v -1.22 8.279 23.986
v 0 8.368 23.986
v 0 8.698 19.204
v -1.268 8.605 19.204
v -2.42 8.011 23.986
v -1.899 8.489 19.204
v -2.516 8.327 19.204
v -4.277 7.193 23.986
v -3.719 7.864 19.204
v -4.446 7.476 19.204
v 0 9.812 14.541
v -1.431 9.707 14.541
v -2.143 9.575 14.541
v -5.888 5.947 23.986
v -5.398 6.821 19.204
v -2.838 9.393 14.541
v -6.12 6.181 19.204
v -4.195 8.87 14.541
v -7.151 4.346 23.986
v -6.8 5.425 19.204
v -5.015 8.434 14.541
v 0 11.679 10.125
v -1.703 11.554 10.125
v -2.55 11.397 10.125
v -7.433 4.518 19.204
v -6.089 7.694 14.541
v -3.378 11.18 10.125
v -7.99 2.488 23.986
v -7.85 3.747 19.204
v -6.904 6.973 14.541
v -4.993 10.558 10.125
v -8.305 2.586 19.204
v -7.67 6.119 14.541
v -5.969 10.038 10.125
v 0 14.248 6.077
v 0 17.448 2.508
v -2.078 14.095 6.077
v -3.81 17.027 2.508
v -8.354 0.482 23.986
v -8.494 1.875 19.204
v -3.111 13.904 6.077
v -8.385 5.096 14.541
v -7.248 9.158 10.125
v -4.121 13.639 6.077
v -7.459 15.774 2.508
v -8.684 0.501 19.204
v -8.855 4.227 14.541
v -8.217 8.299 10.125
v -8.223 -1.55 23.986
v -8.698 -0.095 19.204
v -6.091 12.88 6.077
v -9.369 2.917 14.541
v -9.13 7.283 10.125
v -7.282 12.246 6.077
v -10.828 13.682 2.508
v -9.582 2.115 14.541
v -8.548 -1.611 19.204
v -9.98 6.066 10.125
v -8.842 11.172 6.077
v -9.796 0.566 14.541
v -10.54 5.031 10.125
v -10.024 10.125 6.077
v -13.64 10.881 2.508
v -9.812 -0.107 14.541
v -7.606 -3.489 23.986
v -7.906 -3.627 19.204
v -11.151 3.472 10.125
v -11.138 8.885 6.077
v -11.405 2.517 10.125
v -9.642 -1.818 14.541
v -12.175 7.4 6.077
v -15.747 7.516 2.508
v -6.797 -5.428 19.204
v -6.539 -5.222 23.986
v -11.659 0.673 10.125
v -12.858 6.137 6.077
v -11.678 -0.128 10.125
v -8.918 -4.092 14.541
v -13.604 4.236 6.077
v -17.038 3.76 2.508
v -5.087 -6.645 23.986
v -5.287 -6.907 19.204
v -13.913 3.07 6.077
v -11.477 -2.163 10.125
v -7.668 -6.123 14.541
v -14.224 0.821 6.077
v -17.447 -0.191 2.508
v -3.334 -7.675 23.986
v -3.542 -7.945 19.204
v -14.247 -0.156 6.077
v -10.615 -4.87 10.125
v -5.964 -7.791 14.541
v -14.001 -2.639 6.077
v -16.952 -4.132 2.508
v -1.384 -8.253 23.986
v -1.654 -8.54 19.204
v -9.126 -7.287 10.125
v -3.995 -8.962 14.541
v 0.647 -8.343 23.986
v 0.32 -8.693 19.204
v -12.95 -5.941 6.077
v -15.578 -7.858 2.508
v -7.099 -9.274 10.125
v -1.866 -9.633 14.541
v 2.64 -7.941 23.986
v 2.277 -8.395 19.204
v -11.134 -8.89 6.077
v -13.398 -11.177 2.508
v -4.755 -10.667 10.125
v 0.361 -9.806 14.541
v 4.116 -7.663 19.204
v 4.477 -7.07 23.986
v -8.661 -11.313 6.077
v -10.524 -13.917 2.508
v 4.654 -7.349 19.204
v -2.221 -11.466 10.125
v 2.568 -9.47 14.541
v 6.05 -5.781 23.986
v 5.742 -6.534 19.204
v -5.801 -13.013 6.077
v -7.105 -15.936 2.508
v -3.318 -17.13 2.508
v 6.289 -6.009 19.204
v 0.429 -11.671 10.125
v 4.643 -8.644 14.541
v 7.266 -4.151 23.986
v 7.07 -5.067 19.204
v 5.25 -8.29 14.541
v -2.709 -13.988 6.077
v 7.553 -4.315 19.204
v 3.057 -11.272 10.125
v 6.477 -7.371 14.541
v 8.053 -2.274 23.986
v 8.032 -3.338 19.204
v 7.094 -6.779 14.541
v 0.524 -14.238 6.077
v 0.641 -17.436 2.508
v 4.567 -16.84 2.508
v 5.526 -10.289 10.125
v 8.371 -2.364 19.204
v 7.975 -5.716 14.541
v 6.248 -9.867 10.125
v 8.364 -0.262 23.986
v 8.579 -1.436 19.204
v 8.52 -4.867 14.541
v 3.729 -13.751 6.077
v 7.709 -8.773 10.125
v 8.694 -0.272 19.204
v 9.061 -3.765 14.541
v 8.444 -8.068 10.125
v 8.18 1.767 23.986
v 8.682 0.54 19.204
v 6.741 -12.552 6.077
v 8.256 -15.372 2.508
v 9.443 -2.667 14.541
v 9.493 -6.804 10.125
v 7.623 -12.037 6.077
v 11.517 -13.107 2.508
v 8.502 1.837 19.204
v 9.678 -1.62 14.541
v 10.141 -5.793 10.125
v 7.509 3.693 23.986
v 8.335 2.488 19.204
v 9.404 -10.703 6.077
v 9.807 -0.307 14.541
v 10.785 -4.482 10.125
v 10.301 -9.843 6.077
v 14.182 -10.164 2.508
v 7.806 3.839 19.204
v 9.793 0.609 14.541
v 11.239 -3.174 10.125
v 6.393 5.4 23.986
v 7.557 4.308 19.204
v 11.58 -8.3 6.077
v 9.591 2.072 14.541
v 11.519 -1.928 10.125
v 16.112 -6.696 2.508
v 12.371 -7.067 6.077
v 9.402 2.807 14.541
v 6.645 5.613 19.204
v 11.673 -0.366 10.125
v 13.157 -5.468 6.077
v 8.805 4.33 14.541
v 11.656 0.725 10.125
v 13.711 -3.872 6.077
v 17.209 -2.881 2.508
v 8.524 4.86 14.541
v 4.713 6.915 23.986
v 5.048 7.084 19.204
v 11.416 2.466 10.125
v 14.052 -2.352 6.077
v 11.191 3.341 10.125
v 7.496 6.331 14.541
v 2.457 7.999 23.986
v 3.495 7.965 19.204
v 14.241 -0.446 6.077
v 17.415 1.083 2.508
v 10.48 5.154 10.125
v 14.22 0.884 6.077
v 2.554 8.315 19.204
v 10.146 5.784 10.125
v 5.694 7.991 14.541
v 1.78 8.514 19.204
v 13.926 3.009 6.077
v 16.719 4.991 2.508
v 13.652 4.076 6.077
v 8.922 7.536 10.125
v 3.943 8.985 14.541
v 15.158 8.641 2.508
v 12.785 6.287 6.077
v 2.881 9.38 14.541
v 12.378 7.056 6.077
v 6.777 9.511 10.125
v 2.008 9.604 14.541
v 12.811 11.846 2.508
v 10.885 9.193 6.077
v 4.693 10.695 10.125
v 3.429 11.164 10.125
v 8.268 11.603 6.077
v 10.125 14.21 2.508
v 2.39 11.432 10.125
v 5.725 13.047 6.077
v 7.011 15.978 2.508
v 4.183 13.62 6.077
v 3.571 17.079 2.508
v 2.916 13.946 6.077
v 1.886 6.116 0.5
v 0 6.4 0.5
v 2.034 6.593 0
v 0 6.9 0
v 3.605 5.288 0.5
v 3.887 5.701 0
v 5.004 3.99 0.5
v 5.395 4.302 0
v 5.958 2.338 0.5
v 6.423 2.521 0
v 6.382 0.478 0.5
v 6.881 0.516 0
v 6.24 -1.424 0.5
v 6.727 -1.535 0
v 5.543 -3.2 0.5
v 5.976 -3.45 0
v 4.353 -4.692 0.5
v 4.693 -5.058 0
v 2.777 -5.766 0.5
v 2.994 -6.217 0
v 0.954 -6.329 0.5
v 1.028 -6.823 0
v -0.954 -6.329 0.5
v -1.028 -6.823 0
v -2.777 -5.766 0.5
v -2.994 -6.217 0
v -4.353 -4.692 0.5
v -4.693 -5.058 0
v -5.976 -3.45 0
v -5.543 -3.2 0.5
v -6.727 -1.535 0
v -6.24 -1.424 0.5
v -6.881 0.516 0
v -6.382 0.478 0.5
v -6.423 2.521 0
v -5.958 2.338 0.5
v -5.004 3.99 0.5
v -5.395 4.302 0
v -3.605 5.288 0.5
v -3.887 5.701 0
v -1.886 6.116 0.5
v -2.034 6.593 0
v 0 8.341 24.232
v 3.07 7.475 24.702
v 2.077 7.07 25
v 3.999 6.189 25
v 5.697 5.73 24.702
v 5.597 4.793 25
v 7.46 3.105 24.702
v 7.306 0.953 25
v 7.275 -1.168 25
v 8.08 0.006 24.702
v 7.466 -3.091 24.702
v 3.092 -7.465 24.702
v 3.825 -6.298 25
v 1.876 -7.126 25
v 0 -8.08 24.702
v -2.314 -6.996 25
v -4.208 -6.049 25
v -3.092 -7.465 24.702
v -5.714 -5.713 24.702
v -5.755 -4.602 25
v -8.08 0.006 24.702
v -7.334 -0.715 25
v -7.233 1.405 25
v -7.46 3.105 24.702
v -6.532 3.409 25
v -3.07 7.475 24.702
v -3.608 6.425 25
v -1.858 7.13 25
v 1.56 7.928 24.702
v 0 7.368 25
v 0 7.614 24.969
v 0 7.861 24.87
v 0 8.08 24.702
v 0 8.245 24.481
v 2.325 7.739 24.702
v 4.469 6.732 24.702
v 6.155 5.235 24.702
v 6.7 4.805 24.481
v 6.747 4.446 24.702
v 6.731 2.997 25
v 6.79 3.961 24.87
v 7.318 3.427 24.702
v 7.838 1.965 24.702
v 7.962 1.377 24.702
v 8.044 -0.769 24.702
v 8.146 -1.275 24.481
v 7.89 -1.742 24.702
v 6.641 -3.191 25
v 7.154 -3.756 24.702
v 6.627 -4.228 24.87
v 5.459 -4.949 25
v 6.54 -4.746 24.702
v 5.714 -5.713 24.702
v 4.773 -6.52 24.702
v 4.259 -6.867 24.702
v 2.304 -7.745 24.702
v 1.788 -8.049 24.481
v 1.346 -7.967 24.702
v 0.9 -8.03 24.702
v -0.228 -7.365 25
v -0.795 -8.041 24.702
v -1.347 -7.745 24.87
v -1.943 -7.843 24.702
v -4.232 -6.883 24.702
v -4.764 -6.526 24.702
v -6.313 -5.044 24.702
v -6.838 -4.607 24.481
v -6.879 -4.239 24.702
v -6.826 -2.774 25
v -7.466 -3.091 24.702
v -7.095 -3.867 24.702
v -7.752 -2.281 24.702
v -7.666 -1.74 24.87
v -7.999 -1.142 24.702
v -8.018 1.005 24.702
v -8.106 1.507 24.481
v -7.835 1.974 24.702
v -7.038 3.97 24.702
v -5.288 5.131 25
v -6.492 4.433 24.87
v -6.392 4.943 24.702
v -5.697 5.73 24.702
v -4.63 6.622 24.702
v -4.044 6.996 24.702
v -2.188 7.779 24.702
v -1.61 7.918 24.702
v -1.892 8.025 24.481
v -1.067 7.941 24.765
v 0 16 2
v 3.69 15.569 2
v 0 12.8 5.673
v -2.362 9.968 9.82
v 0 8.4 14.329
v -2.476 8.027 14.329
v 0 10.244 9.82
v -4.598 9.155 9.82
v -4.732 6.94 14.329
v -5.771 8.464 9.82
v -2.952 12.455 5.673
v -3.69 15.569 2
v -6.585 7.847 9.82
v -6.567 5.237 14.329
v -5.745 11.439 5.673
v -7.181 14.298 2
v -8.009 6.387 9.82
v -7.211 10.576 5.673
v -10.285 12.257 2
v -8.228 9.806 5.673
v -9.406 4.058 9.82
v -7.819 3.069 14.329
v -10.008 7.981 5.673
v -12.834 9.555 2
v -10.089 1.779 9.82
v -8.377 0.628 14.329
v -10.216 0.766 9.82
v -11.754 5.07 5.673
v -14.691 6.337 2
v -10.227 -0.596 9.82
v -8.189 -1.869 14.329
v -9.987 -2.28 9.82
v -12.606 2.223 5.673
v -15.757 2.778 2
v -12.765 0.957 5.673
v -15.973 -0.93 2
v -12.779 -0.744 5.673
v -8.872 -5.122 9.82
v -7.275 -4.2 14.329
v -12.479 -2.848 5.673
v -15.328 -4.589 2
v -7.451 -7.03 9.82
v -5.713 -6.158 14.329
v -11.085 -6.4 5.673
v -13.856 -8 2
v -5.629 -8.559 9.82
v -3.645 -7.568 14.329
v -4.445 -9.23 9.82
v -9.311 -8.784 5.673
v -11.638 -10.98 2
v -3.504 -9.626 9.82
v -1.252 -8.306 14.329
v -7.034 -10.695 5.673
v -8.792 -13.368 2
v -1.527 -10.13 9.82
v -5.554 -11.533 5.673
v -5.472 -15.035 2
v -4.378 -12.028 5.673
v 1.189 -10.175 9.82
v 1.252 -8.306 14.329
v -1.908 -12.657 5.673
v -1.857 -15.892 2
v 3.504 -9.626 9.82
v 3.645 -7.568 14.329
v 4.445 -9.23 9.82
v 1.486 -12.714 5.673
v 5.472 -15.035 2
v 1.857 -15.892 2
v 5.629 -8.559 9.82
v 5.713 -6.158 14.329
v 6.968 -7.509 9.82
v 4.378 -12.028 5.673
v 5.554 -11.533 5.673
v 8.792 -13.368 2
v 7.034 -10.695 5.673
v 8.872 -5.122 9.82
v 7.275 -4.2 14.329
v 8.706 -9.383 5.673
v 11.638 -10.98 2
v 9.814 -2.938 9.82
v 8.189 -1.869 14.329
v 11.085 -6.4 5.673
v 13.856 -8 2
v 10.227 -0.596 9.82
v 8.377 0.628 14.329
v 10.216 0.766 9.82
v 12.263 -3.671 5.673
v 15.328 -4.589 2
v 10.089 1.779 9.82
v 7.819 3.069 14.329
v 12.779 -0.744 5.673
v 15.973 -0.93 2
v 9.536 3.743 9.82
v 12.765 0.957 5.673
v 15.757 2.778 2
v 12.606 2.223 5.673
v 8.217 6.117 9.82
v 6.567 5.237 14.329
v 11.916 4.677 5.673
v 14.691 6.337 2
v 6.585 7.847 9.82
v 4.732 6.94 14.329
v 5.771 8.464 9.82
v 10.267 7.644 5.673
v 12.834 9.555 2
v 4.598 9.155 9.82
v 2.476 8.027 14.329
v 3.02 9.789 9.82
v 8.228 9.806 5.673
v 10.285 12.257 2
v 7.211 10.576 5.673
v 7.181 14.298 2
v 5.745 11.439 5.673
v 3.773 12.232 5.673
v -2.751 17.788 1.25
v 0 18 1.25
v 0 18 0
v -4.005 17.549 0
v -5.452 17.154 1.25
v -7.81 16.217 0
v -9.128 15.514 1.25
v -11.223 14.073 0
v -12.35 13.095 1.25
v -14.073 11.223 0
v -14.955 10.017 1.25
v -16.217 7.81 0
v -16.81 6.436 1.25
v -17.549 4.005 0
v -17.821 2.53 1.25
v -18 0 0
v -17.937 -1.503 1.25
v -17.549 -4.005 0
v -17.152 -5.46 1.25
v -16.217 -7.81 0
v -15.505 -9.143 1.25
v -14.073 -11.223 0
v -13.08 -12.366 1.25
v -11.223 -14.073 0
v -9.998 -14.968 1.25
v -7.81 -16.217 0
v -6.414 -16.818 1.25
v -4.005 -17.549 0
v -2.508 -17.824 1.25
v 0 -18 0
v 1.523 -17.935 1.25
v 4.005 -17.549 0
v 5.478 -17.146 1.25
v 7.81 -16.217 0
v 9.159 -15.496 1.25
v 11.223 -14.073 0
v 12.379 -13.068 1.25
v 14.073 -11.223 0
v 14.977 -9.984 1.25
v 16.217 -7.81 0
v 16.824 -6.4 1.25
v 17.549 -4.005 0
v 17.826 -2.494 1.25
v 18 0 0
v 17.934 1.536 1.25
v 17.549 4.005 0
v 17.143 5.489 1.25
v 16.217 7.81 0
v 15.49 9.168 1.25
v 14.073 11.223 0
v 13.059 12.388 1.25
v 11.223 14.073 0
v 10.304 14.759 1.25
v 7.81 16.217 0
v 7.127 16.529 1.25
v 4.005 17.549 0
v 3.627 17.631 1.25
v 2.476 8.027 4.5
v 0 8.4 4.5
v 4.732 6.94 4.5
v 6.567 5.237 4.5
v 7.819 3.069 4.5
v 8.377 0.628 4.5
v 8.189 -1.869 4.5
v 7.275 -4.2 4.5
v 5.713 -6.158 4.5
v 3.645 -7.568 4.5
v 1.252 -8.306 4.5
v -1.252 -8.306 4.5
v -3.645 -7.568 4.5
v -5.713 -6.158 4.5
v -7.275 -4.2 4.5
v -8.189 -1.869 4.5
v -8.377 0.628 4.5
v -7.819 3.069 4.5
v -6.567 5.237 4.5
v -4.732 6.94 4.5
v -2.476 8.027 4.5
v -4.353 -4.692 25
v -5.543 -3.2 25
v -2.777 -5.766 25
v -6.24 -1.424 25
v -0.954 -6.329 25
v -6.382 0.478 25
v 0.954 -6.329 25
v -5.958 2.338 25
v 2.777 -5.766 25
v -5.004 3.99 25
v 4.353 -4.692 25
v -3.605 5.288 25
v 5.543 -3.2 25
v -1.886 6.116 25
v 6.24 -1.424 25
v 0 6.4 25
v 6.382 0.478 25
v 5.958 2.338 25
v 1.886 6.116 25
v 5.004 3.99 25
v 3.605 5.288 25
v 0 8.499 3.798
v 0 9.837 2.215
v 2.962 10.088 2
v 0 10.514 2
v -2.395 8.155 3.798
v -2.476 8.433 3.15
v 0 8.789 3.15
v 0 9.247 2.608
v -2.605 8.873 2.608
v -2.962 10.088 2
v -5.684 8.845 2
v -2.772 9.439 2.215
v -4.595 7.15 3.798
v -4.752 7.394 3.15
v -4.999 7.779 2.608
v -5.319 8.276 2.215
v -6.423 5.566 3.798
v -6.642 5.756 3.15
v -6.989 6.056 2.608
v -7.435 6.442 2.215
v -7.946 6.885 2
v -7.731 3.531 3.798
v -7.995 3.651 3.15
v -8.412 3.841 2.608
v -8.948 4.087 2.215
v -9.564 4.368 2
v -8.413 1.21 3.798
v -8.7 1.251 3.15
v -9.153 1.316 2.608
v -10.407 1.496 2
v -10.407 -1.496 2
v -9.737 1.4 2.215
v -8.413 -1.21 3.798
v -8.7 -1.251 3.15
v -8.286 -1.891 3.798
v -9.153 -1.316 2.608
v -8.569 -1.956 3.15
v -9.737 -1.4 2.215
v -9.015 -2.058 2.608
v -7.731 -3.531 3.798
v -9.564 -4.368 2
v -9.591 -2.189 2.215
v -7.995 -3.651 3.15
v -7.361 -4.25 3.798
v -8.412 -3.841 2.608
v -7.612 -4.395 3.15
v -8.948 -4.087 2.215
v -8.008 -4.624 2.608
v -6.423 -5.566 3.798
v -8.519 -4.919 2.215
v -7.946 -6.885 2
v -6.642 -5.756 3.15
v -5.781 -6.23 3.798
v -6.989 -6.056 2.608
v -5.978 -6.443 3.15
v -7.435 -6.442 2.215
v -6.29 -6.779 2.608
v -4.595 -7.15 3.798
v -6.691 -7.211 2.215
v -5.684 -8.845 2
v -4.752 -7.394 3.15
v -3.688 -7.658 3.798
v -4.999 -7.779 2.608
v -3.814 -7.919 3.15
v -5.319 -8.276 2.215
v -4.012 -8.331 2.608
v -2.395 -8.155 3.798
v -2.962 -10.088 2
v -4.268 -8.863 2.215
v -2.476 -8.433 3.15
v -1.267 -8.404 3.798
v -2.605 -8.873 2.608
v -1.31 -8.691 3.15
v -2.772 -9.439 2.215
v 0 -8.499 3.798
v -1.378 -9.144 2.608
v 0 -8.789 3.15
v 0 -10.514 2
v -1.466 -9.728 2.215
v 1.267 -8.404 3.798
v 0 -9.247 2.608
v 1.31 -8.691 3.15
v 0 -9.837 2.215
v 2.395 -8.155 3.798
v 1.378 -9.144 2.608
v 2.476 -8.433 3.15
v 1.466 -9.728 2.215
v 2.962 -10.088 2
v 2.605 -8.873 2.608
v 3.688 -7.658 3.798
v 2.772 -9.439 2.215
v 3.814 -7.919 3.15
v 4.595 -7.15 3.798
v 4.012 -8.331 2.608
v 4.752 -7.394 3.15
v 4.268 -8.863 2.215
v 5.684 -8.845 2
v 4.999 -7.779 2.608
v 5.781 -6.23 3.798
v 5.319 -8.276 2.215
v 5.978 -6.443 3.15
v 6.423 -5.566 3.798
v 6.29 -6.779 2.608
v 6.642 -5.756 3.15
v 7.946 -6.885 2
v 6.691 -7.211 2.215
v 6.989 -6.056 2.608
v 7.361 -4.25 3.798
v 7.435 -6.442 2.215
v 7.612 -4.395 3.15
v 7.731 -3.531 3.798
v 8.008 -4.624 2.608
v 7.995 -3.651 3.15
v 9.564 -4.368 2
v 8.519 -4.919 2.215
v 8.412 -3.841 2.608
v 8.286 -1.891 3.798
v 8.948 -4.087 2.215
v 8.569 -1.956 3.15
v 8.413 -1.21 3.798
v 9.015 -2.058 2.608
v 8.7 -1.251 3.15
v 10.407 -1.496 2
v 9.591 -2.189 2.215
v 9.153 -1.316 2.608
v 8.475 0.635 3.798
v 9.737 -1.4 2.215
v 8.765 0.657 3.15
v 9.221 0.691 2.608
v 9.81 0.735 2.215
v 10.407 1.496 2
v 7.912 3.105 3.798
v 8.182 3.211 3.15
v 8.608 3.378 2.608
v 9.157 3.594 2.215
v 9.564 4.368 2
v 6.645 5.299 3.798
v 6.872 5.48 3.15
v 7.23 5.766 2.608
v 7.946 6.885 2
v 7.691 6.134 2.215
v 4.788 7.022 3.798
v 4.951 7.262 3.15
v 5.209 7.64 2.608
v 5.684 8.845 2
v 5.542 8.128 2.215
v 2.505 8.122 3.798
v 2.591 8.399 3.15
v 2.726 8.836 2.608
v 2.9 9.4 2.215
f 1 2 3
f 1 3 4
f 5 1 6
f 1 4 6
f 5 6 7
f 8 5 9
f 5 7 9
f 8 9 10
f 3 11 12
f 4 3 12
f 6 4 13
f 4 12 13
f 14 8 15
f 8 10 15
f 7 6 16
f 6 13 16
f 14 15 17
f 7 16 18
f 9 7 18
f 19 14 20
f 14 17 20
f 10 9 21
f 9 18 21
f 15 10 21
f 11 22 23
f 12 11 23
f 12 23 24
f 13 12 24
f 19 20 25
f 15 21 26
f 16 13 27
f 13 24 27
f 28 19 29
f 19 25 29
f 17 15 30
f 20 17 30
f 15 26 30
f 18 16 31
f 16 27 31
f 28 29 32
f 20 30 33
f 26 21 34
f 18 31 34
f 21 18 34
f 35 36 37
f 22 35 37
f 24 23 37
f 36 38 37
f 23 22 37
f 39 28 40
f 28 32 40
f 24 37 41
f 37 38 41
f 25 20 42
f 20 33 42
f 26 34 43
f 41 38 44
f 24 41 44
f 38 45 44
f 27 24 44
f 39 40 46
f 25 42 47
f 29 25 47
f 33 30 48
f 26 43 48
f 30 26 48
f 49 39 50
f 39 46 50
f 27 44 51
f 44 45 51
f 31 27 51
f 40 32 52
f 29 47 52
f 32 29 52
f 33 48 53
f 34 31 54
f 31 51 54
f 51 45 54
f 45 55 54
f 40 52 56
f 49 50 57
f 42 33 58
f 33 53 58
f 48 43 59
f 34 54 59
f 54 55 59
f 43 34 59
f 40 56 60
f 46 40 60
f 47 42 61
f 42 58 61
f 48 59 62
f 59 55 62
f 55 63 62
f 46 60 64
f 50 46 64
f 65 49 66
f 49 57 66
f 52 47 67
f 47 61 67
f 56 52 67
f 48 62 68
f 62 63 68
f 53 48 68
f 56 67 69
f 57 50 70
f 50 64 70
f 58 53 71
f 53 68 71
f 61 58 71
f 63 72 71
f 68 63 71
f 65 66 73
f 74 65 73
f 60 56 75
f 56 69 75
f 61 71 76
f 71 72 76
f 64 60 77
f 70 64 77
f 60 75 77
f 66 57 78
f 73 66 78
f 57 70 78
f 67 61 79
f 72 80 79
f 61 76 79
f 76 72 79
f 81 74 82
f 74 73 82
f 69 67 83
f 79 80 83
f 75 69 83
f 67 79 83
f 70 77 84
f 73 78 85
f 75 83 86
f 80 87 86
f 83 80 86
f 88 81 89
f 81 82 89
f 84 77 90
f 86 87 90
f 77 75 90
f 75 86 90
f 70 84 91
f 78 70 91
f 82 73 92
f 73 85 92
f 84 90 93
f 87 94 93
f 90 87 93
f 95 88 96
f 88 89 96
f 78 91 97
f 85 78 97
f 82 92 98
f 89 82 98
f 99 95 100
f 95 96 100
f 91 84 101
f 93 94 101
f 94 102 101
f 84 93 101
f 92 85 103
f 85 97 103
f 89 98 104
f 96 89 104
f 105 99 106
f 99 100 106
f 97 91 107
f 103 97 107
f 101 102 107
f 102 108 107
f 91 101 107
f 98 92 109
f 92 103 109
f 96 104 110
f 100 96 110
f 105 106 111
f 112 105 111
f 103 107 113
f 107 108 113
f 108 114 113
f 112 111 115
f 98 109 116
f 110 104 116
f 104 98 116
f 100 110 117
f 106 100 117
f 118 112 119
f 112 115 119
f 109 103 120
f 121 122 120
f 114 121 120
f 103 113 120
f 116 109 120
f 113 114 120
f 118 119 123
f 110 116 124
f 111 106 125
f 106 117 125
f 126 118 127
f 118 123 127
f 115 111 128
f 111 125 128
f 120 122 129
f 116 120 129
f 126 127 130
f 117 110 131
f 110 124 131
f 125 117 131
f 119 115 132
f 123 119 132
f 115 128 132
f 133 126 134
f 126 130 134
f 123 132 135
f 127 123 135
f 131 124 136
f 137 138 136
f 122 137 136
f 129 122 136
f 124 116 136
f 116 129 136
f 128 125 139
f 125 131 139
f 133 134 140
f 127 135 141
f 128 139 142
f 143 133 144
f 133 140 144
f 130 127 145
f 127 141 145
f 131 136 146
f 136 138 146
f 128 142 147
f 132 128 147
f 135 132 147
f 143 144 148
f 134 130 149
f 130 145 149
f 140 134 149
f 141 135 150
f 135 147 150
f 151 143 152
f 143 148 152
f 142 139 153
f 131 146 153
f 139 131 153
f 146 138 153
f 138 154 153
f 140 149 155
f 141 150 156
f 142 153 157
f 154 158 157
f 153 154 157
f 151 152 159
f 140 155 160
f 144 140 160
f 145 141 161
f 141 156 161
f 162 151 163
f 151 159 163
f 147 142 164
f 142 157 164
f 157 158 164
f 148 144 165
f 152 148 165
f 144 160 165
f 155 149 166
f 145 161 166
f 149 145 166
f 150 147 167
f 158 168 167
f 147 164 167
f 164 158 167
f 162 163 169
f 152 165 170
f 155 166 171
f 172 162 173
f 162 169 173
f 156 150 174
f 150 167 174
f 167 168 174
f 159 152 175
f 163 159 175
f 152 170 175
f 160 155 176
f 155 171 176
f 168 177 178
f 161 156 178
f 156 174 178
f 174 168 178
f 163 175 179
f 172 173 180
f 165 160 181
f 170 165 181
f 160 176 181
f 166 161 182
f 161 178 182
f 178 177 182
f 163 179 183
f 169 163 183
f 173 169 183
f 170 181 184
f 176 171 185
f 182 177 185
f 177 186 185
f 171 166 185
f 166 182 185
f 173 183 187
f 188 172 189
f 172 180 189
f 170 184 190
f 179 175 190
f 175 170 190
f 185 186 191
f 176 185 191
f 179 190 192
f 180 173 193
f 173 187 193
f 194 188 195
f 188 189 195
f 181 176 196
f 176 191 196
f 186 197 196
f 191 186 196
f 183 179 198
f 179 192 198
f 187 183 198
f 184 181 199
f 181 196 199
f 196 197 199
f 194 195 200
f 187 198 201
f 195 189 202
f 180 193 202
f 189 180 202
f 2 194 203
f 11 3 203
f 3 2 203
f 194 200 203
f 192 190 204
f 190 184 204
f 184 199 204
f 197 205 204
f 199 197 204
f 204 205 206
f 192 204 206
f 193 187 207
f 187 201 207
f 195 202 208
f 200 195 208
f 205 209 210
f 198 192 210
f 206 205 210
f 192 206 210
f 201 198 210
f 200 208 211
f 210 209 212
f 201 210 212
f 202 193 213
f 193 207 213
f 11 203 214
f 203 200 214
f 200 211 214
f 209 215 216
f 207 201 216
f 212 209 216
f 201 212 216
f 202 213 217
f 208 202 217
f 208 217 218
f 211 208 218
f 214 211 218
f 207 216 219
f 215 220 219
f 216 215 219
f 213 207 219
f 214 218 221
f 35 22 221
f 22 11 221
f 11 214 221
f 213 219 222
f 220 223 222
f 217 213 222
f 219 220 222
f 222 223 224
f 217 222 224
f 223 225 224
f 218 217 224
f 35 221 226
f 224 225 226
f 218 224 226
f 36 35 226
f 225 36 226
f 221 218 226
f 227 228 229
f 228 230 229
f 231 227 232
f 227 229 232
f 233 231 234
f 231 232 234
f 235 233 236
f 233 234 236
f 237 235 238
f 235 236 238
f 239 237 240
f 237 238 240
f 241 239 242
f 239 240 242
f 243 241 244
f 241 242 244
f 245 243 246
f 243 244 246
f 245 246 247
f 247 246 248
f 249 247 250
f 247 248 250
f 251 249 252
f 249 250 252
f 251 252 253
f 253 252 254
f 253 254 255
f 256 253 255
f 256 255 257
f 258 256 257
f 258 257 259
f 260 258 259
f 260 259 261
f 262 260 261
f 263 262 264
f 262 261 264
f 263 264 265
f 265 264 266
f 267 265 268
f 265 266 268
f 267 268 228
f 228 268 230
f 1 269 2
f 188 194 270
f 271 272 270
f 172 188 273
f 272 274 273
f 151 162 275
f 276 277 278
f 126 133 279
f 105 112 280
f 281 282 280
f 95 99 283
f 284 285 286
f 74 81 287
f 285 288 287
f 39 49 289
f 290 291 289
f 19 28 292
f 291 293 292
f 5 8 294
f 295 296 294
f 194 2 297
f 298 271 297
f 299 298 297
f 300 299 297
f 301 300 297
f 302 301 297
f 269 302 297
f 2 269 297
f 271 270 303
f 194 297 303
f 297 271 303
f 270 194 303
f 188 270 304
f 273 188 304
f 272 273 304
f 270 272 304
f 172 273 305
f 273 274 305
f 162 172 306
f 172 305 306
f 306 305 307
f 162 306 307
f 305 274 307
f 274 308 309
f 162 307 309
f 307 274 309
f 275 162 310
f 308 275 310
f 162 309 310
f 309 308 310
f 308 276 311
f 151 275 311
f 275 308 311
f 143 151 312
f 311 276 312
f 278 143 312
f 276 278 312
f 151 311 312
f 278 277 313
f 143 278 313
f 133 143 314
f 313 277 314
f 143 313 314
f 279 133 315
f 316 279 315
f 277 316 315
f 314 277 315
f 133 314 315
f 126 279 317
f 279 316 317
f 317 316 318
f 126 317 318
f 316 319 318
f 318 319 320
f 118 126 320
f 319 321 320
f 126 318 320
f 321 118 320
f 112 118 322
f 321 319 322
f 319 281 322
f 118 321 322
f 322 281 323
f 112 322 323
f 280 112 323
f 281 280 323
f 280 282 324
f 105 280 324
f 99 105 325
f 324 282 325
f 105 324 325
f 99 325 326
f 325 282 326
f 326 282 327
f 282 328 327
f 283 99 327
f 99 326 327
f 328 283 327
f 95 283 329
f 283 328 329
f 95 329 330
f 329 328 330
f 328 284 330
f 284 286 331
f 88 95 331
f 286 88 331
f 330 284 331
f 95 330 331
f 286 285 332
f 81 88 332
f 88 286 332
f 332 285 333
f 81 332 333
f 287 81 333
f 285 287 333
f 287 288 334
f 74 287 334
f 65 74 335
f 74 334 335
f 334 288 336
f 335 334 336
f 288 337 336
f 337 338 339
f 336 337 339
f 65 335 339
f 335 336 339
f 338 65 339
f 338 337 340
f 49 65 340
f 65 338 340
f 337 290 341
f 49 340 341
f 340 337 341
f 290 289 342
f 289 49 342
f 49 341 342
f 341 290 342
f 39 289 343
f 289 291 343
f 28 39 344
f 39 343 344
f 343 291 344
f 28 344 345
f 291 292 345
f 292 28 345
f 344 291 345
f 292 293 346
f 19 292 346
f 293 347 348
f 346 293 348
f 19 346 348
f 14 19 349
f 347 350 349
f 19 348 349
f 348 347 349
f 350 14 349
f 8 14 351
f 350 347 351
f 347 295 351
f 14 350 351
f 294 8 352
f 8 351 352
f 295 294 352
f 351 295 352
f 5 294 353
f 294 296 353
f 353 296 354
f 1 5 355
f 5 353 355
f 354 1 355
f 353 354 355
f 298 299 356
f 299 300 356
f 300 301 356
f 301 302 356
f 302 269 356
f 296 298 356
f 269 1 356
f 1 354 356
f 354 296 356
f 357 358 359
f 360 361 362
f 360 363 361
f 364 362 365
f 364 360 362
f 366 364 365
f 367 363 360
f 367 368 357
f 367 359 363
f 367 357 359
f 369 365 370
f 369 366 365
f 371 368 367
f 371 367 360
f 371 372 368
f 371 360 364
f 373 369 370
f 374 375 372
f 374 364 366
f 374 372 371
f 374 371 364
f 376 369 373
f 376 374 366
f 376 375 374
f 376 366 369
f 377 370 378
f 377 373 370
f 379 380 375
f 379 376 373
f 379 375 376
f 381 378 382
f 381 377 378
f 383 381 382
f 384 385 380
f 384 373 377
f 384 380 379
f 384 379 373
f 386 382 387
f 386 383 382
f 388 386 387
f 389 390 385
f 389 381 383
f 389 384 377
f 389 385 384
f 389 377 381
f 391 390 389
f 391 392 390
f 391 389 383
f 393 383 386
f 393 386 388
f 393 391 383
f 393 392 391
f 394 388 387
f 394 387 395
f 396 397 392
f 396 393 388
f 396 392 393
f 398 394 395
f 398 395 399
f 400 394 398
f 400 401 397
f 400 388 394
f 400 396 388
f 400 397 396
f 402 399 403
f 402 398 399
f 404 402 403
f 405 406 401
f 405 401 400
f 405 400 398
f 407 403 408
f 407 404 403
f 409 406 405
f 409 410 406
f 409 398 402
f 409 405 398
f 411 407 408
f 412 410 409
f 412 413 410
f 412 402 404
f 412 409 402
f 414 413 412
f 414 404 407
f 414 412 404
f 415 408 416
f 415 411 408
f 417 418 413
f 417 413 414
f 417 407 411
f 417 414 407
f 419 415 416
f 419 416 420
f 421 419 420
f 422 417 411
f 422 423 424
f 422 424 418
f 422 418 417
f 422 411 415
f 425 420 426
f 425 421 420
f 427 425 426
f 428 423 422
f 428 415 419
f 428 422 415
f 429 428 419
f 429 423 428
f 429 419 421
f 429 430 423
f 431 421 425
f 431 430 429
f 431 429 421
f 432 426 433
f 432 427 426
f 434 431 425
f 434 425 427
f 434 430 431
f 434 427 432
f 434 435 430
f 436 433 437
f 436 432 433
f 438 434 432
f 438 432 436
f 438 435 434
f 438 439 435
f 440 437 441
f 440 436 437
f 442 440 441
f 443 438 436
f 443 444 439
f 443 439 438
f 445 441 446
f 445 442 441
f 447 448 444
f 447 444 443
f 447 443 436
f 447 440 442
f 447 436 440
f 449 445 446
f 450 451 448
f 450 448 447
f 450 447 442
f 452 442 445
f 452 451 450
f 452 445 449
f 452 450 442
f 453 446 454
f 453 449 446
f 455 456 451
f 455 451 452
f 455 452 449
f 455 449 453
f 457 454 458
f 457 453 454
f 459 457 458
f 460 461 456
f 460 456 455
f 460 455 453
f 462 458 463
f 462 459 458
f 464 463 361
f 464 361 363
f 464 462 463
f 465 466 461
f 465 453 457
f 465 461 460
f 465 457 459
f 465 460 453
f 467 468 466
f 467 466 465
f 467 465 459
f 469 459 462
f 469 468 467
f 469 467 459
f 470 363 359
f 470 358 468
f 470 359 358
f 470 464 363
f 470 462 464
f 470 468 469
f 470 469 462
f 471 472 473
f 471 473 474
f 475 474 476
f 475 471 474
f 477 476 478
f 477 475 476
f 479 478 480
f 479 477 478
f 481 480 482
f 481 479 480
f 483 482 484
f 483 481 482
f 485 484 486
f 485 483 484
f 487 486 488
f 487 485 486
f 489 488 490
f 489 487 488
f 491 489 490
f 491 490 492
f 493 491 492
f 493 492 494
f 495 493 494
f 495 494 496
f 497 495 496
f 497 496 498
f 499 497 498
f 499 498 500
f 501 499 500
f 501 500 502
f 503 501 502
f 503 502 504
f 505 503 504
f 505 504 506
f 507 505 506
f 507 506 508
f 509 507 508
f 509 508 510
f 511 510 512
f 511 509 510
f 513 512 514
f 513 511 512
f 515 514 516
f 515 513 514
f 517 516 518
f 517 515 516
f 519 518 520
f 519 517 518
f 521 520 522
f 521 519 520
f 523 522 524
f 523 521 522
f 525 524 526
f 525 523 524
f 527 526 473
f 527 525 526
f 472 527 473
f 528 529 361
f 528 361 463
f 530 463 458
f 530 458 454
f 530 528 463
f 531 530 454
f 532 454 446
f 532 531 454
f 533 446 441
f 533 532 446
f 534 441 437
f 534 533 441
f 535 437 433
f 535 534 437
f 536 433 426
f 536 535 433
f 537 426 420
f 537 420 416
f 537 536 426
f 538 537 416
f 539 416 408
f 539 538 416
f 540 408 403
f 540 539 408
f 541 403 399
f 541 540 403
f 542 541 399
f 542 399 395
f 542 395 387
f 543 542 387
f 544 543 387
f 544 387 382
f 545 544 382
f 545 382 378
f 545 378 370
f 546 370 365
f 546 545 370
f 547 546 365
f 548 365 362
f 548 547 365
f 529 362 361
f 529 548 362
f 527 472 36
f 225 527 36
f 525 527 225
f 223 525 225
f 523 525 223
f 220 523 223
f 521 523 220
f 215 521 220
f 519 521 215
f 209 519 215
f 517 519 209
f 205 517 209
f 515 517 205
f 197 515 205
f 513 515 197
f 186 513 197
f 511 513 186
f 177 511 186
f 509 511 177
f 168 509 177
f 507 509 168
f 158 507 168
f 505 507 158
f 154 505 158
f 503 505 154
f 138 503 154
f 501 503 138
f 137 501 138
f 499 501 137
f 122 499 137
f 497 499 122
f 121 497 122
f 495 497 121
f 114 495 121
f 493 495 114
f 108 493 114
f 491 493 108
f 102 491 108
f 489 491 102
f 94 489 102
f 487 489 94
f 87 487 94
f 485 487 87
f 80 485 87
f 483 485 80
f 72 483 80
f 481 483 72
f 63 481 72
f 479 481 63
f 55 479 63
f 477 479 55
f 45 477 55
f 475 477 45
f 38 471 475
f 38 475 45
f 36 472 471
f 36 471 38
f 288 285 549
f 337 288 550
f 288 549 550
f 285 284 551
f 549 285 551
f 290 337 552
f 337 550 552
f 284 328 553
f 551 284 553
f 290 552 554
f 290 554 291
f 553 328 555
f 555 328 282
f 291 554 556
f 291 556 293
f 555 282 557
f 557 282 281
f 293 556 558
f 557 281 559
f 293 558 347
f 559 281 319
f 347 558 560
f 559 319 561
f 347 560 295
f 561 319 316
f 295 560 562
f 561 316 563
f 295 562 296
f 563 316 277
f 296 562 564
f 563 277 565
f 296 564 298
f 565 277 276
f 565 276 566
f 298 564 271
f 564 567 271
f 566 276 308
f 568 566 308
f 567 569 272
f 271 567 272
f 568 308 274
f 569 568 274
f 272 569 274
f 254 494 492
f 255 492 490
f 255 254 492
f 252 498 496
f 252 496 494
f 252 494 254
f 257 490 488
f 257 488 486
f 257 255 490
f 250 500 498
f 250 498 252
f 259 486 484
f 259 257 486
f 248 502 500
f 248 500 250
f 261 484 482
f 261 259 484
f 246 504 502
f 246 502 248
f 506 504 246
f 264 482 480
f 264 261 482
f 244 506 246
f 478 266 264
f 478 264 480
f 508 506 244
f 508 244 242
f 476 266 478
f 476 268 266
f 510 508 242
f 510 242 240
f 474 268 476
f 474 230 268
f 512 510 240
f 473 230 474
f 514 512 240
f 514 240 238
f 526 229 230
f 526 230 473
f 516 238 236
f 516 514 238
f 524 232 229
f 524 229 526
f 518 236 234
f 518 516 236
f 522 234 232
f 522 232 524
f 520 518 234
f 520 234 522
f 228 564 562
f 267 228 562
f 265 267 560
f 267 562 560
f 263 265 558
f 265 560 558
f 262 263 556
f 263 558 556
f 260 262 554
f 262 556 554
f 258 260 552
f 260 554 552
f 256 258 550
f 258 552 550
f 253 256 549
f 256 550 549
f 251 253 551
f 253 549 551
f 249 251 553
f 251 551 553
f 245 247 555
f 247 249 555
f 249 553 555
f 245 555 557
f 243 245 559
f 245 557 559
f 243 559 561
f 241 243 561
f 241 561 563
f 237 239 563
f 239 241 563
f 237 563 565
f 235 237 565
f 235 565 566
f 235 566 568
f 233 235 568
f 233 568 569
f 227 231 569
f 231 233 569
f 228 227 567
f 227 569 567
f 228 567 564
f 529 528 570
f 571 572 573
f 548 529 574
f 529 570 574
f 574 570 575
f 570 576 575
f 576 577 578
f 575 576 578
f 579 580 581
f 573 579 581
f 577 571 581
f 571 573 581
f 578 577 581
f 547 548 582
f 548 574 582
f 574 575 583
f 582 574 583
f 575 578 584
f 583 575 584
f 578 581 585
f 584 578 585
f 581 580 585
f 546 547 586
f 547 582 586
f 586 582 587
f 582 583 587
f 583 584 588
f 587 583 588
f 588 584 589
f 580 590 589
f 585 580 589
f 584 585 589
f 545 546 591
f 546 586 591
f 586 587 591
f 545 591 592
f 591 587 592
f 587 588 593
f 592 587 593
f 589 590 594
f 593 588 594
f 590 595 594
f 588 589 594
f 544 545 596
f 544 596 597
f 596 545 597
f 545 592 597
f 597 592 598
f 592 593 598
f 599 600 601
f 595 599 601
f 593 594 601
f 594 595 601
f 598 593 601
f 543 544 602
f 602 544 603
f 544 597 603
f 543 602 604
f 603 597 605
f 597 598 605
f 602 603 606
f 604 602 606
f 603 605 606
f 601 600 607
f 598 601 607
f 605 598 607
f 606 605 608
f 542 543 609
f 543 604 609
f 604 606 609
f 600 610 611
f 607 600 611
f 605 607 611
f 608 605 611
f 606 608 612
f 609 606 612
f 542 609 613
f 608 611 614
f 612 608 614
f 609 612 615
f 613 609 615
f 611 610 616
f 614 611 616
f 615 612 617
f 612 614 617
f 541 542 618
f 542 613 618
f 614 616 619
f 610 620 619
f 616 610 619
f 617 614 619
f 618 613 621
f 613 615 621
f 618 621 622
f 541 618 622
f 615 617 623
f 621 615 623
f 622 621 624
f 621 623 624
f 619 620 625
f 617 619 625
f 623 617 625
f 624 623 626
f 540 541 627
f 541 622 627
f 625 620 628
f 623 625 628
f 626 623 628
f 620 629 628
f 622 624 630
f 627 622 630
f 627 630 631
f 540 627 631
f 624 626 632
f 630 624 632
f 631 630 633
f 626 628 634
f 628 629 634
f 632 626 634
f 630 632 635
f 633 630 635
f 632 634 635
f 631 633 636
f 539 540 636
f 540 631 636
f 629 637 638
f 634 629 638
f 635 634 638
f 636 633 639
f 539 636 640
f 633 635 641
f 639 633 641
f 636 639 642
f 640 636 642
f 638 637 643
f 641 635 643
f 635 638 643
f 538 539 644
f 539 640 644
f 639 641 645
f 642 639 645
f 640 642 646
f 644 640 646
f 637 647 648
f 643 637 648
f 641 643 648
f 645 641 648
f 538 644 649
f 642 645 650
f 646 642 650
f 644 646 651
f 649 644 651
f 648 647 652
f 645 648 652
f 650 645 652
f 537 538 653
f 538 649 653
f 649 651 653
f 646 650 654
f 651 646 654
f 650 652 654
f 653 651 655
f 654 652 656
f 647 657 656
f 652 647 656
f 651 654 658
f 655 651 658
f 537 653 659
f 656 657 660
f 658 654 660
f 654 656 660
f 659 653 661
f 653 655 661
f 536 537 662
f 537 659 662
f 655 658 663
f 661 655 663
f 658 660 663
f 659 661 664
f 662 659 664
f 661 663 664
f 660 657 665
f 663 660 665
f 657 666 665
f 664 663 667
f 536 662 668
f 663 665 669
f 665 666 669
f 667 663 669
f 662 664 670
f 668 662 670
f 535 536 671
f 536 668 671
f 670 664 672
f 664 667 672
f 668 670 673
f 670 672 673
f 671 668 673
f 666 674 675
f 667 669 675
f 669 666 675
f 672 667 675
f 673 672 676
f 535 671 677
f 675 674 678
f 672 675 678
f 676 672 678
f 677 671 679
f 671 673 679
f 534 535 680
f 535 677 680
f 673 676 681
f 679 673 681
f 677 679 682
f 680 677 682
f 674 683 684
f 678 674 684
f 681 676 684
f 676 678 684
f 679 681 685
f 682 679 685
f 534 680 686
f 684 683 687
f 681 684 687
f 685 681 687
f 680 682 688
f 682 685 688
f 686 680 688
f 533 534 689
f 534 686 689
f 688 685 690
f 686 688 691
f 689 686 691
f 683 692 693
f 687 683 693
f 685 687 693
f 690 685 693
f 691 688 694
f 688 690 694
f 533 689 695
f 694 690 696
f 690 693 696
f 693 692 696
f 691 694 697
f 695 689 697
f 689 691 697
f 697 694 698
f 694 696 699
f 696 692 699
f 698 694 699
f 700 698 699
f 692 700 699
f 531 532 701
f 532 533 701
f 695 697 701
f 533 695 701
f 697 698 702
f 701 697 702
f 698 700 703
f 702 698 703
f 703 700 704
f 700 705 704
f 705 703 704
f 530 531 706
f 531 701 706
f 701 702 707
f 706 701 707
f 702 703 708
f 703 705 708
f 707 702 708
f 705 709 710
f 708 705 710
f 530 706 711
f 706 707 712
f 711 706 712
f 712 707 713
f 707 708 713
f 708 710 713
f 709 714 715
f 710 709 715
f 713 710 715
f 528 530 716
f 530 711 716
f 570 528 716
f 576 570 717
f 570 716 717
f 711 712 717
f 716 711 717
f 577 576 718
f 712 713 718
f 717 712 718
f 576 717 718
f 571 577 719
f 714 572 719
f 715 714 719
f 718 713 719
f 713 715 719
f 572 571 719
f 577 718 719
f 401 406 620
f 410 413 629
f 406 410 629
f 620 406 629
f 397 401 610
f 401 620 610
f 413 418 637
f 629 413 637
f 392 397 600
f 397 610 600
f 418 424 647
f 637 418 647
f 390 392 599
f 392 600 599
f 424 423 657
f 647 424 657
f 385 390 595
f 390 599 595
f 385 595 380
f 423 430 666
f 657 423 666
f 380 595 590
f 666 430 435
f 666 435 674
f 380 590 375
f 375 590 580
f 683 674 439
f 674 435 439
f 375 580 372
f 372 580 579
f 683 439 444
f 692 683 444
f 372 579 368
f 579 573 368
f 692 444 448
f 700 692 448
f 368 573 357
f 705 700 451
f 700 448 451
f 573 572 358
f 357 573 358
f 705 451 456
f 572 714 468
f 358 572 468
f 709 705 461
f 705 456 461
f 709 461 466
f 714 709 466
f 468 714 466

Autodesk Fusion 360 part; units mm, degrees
sketch "Sketch1" plane through (0, 0, 0) normal (1, 0, 0) x (0, 1, 0)
  line L0 (6.4, 0) -> (6.4, 25)
  line L1 (0, 25) -> (0, 0)
  line L2 (6.4, 0.1899) -> (6.4, 25)
  line L3 (0, 0) -> (18, 0)
  line L4 (0, 1) -> (0, 0)
  line L5 (6.4, 25) -> (7.4, 25)
  line L6 (18, 0) -> (18, 1)
  line L7 (18, 1) -> (16.5, 1) construction
  line L8 (7.4, 25) -> (8.4, 25)
  line L9 (18, 1) -> (18, 2)
  arc A0 (8.4, 25) -> (18, 2) centre (37.363, 23.5854) ccw
  line L10 (8.4, 25) -> (8.4, 7)
  line L11 (18, 2) -> (9, 2)
  line L12 (18, 2) -> (16, 2)
  arc A1 (8.4, 14.3286) -> (16, 2) centre (36.7237, 23.282) ccw
  line L13 (8.4, 7) -> (8.4, 2)
  line L14 (8.4, 2) -> (9, 2)
  arc A2 (8.4, 4.5) -> (10.5136, 2) centre (10.9353, 4.5) ccw
  dimension "d1" = 6.4
  dimension "d2" = 25
  dimension "d10" = 1
  dimension "d11" = 1
  dimension "d14" = 1
  dimension "d15" = 1
  dimension "d16" = 2
revolve "Revolve3" add sketch "Sketch1" angle 360 about axis through (0, 0, 25) along (0, 0, -1) contours L0 L2 L3 L5 L6 L8 L9 A0 L10 L11 L12 L13 L14 | A0 L10 L11 L12 A1 | L11 L13 L14 A2
chamfer "Chamfer4" distance 0.75 angle 45 1 edges at (-16.7819, 6.5091, 2)
chamfer "Chamfer5" distance 0.5 angle 45 1 edges at (-5.9669, 2.3143, 0)
fillet "Fillet1" radius 1 1 edges at (-7.8315, 3.0376, 25)
